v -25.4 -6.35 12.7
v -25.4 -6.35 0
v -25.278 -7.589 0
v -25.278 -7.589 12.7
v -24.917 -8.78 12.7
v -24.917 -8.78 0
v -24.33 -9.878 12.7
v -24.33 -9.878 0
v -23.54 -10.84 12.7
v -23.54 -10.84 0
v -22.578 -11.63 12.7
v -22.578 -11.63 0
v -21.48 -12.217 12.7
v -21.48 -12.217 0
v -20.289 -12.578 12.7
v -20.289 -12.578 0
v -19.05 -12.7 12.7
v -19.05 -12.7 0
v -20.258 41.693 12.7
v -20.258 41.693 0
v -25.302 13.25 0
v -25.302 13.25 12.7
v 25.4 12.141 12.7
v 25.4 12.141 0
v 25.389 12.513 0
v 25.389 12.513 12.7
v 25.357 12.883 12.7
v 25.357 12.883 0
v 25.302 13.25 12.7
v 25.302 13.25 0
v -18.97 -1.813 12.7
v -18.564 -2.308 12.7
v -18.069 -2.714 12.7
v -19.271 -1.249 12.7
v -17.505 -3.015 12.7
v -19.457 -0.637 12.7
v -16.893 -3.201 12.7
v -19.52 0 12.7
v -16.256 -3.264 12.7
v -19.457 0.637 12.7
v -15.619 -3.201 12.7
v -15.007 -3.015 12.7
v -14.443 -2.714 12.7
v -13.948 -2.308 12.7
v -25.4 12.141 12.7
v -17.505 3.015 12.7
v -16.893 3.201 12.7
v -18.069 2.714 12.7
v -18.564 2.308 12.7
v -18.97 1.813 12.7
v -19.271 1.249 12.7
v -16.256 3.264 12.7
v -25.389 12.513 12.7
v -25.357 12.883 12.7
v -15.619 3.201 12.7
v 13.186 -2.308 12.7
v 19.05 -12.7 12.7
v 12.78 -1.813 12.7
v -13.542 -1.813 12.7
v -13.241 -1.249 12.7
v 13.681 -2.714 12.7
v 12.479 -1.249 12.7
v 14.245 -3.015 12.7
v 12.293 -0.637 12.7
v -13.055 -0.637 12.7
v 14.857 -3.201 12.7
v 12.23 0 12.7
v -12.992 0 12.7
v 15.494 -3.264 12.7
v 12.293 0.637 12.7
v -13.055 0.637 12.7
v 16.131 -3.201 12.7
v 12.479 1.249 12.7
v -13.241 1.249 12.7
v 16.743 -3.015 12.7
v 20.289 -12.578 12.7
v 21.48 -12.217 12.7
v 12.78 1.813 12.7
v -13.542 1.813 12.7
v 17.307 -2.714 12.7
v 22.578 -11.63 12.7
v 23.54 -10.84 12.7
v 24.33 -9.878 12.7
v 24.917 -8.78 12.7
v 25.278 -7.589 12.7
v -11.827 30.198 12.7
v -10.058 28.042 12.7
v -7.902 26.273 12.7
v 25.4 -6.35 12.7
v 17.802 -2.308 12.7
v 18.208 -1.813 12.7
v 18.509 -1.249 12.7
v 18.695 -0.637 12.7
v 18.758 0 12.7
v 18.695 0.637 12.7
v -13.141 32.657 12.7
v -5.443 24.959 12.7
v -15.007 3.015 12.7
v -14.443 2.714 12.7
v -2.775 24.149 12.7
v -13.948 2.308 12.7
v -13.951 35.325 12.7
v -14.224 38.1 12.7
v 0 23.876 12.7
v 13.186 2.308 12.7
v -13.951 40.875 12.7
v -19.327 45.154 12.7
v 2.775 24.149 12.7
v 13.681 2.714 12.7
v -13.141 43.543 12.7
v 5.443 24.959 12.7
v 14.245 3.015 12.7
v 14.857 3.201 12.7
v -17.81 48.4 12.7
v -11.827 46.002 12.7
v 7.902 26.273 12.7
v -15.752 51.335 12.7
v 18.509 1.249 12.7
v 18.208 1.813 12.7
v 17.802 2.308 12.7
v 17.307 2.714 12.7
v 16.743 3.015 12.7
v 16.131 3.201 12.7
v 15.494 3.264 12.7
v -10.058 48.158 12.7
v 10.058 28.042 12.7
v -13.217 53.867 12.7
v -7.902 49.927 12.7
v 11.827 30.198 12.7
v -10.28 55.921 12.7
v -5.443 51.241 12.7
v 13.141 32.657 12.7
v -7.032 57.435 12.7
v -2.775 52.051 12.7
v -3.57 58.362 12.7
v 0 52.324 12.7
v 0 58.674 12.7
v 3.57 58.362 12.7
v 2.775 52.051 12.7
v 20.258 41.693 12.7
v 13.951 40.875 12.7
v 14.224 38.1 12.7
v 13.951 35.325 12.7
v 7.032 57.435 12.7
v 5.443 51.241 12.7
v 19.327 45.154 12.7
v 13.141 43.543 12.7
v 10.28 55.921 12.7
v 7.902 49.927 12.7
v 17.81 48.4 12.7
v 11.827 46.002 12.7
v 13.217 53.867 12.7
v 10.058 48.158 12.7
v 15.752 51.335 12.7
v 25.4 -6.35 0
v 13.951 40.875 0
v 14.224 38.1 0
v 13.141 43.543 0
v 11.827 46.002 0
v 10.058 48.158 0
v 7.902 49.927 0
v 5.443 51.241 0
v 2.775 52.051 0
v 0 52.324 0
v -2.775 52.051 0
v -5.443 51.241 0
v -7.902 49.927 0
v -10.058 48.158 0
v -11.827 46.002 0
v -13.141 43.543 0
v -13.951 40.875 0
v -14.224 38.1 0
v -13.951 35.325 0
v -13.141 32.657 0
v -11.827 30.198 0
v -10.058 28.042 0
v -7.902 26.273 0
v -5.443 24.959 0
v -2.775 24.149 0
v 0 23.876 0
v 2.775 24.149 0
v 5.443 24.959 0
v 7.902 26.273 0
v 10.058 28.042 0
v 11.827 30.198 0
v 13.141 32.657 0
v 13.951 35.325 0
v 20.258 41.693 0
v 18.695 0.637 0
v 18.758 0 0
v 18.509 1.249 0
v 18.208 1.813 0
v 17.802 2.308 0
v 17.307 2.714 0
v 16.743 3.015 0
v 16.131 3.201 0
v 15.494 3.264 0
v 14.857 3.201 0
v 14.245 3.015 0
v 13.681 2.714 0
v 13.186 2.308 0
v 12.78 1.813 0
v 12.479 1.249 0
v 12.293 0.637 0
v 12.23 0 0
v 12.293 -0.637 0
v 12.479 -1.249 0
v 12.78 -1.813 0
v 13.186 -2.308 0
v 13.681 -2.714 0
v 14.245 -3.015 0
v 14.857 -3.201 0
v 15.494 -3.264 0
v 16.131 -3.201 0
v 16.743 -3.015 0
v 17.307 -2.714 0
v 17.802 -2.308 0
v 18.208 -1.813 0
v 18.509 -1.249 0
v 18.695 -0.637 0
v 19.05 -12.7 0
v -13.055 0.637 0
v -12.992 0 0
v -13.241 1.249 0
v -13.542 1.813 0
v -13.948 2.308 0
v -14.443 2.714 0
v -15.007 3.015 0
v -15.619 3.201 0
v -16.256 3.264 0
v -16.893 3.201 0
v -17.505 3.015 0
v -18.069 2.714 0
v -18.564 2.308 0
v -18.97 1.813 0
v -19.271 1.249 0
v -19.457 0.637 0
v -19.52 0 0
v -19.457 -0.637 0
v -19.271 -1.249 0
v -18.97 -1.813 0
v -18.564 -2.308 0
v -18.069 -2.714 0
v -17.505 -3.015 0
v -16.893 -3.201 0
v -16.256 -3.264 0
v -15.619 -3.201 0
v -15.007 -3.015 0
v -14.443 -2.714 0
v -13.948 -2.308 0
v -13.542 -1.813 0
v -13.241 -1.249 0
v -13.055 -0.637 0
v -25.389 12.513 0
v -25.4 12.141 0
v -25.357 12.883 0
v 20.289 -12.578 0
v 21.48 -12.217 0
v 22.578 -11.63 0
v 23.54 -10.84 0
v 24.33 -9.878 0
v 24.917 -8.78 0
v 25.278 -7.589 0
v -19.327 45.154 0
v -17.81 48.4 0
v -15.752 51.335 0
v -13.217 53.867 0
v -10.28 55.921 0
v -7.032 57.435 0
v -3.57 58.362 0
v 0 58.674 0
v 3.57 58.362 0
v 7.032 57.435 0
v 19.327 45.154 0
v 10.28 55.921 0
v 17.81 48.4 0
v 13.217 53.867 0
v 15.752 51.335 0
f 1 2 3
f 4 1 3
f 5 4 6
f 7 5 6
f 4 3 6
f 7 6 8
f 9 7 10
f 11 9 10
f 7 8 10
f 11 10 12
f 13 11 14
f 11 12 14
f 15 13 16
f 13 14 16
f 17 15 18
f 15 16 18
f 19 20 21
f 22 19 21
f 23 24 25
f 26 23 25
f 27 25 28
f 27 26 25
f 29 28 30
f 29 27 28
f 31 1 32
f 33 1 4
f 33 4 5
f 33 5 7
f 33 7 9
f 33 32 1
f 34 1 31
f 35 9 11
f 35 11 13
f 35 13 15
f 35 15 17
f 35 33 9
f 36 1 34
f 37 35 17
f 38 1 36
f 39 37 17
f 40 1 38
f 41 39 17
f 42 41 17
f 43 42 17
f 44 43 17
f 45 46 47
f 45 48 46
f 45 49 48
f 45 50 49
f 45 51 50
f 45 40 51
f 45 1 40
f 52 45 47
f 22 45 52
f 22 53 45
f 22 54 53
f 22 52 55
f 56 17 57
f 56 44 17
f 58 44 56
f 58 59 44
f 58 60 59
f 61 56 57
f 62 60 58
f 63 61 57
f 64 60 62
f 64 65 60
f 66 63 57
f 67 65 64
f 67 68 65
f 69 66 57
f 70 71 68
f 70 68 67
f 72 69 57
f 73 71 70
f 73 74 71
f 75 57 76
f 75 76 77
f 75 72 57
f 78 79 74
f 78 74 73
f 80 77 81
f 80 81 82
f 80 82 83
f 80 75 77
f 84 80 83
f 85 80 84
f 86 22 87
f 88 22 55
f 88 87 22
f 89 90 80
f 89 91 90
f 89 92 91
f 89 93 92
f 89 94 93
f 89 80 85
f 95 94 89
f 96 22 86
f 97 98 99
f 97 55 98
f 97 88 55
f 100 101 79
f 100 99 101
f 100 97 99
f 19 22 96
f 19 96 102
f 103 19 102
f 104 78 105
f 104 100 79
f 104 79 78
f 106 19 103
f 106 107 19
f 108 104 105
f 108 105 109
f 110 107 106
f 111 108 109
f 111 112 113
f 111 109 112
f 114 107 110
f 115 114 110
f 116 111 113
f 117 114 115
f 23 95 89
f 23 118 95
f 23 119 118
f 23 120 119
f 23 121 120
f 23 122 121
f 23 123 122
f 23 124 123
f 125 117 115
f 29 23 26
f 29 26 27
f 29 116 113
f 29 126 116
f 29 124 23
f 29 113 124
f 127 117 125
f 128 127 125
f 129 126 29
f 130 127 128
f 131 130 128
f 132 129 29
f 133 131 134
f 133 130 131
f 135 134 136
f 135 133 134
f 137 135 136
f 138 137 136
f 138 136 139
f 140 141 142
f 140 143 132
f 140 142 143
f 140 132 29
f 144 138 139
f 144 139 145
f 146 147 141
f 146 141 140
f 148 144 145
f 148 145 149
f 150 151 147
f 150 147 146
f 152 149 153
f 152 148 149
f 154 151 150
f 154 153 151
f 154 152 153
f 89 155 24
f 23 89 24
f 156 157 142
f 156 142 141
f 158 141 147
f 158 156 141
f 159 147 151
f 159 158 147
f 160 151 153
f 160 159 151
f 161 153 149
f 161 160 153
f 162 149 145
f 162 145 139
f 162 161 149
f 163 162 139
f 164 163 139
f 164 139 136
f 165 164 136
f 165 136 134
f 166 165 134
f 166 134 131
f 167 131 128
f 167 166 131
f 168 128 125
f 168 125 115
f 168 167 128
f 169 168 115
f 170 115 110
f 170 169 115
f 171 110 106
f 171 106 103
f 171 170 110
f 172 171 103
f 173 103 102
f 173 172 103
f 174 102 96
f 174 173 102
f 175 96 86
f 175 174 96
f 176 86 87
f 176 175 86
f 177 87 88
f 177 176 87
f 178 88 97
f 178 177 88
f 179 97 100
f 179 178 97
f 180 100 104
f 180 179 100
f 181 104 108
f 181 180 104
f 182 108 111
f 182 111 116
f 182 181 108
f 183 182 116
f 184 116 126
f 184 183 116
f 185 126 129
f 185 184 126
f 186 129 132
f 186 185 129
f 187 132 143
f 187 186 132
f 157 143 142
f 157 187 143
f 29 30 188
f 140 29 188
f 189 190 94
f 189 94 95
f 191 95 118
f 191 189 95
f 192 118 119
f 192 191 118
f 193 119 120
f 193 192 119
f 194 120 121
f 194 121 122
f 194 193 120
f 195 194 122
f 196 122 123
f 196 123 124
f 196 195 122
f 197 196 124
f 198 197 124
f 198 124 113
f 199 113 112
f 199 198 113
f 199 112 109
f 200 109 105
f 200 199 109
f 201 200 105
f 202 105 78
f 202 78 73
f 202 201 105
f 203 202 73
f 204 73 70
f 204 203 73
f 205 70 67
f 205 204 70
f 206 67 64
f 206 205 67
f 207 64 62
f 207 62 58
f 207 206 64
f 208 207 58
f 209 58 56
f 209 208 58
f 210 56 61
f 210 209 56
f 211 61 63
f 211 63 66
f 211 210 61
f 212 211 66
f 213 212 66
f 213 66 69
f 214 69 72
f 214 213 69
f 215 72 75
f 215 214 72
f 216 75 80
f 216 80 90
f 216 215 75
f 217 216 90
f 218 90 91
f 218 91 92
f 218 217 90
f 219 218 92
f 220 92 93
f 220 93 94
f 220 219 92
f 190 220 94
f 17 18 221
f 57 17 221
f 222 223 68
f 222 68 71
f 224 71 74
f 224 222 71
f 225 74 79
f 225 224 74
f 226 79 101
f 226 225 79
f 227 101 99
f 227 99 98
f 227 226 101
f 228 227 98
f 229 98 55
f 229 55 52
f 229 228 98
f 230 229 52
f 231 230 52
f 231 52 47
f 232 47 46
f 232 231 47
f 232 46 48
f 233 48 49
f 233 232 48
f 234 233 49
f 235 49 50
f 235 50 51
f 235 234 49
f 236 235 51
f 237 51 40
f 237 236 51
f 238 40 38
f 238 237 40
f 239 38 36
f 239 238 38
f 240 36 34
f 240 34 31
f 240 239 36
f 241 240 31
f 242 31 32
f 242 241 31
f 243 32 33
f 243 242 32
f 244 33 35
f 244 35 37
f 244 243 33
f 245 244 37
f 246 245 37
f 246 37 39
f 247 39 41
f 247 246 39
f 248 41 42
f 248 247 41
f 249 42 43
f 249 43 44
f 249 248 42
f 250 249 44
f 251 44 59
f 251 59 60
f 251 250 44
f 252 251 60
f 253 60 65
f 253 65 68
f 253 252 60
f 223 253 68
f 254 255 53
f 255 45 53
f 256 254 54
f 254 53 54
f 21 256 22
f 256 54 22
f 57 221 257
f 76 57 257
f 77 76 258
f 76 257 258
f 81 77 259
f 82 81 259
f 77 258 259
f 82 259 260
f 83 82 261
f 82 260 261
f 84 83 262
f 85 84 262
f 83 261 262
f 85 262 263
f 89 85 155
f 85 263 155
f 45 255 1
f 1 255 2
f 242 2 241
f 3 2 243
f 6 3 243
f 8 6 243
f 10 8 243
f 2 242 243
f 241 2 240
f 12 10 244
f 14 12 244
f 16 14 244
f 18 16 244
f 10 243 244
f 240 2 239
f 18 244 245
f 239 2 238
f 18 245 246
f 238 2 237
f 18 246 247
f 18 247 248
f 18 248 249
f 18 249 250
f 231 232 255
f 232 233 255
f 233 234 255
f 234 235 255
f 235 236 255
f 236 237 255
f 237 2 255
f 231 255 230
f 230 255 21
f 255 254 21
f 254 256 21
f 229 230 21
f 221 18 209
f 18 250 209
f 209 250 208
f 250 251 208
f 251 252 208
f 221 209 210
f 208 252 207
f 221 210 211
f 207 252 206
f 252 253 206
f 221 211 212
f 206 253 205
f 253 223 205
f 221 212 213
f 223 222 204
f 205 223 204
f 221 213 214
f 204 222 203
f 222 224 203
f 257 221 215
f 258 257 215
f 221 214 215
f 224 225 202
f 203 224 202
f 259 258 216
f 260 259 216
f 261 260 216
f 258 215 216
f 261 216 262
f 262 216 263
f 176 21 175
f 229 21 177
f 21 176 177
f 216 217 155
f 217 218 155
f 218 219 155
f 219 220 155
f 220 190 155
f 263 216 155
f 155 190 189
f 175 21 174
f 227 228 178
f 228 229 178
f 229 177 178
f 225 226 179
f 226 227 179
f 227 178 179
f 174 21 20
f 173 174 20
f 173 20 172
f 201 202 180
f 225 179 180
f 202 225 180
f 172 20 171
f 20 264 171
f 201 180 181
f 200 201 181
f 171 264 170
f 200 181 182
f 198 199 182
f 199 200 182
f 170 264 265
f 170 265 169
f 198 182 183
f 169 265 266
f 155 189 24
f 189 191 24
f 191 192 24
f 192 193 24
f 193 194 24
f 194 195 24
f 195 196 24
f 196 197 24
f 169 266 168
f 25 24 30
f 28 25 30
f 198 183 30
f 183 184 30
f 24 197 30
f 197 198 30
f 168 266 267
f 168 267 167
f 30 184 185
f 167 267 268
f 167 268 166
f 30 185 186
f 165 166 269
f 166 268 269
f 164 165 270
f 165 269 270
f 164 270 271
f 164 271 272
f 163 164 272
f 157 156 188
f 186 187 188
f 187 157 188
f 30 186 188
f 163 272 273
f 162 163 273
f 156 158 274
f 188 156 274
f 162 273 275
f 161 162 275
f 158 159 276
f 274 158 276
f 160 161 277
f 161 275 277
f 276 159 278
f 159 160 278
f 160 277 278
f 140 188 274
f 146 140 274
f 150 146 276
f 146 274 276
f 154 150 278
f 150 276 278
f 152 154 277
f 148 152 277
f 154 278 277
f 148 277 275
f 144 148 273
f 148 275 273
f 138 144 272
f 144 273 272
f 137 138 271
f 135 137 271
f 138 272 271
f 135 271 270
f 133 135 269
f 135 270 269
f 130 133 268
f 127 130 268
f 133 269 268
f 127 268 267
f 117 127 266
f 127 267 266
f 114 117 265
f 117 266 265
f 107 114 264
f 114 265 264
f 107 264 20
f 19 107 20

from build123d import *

# Parameters (mm, degrees)
F0_R     = 3.2639
F0_R_2   = 14.224
F1_DEPTH = 12.7
F2_R     = 6.35


# Not quite as in the source:
# - ends of sketch curves that miss each other by under 0.0002 mm in the source are joined


with BuildPart() as f1:
    # F0 (on Top) → F1 (new body)
    with BuildSketch(Plane.XY):
        with BuildLine():
            Line((-19.0499999385, -12.7), (19.0500000615, -12.7))
            ThreePointArc((19.0500000615, -12.7), (23.5401281437, -10.8401280388), (25.4000000615, -6.3499999385))
            Line((25.4000000615, -6.3499999385), (25.3999998771, 12.7))
            Line((25.3999998771, 12.7), (20.257849715, 41.692909813))
            ThreePointArc((20.257849715, 41.692909813), (0, 58.674), (-20.257849715, 41.692909813))
            Line((-20.257849715, 41.692909813), (-25.4000001229, 12.7))
            Line((-25.4000001229, 12.7), (-25.3999999385, -6.3500000615))
            ThreePointArc((-25.3999999385, -6.3500000615), (-23.5401279774, -10.8401280823), (-19.0499999385, -12.7))
        make_face()
        with Locations((-16.256, 0)):
            Circle(F0_R, mode=Mode.SUBTRACT)
        with Locations((15.494, 0)):
            Circle(F0_R, mode=Mode.SUBTRACT)
        with Locations((0, 38.1)):
            Circle(F0_R_2, mode=Mode.SUBTRACT)
    extrude(amount=F1_DEPTH)

    # F2
    f2_edges = [f1.edges().sort_by_distance(p)[0] for p in [
        (25.4, 12.7, 6.35),
        (-25.4, 12.7, 6.35),
    ]]
    fillet(f2_edges, radius=F2_R)


solid = f1.part
